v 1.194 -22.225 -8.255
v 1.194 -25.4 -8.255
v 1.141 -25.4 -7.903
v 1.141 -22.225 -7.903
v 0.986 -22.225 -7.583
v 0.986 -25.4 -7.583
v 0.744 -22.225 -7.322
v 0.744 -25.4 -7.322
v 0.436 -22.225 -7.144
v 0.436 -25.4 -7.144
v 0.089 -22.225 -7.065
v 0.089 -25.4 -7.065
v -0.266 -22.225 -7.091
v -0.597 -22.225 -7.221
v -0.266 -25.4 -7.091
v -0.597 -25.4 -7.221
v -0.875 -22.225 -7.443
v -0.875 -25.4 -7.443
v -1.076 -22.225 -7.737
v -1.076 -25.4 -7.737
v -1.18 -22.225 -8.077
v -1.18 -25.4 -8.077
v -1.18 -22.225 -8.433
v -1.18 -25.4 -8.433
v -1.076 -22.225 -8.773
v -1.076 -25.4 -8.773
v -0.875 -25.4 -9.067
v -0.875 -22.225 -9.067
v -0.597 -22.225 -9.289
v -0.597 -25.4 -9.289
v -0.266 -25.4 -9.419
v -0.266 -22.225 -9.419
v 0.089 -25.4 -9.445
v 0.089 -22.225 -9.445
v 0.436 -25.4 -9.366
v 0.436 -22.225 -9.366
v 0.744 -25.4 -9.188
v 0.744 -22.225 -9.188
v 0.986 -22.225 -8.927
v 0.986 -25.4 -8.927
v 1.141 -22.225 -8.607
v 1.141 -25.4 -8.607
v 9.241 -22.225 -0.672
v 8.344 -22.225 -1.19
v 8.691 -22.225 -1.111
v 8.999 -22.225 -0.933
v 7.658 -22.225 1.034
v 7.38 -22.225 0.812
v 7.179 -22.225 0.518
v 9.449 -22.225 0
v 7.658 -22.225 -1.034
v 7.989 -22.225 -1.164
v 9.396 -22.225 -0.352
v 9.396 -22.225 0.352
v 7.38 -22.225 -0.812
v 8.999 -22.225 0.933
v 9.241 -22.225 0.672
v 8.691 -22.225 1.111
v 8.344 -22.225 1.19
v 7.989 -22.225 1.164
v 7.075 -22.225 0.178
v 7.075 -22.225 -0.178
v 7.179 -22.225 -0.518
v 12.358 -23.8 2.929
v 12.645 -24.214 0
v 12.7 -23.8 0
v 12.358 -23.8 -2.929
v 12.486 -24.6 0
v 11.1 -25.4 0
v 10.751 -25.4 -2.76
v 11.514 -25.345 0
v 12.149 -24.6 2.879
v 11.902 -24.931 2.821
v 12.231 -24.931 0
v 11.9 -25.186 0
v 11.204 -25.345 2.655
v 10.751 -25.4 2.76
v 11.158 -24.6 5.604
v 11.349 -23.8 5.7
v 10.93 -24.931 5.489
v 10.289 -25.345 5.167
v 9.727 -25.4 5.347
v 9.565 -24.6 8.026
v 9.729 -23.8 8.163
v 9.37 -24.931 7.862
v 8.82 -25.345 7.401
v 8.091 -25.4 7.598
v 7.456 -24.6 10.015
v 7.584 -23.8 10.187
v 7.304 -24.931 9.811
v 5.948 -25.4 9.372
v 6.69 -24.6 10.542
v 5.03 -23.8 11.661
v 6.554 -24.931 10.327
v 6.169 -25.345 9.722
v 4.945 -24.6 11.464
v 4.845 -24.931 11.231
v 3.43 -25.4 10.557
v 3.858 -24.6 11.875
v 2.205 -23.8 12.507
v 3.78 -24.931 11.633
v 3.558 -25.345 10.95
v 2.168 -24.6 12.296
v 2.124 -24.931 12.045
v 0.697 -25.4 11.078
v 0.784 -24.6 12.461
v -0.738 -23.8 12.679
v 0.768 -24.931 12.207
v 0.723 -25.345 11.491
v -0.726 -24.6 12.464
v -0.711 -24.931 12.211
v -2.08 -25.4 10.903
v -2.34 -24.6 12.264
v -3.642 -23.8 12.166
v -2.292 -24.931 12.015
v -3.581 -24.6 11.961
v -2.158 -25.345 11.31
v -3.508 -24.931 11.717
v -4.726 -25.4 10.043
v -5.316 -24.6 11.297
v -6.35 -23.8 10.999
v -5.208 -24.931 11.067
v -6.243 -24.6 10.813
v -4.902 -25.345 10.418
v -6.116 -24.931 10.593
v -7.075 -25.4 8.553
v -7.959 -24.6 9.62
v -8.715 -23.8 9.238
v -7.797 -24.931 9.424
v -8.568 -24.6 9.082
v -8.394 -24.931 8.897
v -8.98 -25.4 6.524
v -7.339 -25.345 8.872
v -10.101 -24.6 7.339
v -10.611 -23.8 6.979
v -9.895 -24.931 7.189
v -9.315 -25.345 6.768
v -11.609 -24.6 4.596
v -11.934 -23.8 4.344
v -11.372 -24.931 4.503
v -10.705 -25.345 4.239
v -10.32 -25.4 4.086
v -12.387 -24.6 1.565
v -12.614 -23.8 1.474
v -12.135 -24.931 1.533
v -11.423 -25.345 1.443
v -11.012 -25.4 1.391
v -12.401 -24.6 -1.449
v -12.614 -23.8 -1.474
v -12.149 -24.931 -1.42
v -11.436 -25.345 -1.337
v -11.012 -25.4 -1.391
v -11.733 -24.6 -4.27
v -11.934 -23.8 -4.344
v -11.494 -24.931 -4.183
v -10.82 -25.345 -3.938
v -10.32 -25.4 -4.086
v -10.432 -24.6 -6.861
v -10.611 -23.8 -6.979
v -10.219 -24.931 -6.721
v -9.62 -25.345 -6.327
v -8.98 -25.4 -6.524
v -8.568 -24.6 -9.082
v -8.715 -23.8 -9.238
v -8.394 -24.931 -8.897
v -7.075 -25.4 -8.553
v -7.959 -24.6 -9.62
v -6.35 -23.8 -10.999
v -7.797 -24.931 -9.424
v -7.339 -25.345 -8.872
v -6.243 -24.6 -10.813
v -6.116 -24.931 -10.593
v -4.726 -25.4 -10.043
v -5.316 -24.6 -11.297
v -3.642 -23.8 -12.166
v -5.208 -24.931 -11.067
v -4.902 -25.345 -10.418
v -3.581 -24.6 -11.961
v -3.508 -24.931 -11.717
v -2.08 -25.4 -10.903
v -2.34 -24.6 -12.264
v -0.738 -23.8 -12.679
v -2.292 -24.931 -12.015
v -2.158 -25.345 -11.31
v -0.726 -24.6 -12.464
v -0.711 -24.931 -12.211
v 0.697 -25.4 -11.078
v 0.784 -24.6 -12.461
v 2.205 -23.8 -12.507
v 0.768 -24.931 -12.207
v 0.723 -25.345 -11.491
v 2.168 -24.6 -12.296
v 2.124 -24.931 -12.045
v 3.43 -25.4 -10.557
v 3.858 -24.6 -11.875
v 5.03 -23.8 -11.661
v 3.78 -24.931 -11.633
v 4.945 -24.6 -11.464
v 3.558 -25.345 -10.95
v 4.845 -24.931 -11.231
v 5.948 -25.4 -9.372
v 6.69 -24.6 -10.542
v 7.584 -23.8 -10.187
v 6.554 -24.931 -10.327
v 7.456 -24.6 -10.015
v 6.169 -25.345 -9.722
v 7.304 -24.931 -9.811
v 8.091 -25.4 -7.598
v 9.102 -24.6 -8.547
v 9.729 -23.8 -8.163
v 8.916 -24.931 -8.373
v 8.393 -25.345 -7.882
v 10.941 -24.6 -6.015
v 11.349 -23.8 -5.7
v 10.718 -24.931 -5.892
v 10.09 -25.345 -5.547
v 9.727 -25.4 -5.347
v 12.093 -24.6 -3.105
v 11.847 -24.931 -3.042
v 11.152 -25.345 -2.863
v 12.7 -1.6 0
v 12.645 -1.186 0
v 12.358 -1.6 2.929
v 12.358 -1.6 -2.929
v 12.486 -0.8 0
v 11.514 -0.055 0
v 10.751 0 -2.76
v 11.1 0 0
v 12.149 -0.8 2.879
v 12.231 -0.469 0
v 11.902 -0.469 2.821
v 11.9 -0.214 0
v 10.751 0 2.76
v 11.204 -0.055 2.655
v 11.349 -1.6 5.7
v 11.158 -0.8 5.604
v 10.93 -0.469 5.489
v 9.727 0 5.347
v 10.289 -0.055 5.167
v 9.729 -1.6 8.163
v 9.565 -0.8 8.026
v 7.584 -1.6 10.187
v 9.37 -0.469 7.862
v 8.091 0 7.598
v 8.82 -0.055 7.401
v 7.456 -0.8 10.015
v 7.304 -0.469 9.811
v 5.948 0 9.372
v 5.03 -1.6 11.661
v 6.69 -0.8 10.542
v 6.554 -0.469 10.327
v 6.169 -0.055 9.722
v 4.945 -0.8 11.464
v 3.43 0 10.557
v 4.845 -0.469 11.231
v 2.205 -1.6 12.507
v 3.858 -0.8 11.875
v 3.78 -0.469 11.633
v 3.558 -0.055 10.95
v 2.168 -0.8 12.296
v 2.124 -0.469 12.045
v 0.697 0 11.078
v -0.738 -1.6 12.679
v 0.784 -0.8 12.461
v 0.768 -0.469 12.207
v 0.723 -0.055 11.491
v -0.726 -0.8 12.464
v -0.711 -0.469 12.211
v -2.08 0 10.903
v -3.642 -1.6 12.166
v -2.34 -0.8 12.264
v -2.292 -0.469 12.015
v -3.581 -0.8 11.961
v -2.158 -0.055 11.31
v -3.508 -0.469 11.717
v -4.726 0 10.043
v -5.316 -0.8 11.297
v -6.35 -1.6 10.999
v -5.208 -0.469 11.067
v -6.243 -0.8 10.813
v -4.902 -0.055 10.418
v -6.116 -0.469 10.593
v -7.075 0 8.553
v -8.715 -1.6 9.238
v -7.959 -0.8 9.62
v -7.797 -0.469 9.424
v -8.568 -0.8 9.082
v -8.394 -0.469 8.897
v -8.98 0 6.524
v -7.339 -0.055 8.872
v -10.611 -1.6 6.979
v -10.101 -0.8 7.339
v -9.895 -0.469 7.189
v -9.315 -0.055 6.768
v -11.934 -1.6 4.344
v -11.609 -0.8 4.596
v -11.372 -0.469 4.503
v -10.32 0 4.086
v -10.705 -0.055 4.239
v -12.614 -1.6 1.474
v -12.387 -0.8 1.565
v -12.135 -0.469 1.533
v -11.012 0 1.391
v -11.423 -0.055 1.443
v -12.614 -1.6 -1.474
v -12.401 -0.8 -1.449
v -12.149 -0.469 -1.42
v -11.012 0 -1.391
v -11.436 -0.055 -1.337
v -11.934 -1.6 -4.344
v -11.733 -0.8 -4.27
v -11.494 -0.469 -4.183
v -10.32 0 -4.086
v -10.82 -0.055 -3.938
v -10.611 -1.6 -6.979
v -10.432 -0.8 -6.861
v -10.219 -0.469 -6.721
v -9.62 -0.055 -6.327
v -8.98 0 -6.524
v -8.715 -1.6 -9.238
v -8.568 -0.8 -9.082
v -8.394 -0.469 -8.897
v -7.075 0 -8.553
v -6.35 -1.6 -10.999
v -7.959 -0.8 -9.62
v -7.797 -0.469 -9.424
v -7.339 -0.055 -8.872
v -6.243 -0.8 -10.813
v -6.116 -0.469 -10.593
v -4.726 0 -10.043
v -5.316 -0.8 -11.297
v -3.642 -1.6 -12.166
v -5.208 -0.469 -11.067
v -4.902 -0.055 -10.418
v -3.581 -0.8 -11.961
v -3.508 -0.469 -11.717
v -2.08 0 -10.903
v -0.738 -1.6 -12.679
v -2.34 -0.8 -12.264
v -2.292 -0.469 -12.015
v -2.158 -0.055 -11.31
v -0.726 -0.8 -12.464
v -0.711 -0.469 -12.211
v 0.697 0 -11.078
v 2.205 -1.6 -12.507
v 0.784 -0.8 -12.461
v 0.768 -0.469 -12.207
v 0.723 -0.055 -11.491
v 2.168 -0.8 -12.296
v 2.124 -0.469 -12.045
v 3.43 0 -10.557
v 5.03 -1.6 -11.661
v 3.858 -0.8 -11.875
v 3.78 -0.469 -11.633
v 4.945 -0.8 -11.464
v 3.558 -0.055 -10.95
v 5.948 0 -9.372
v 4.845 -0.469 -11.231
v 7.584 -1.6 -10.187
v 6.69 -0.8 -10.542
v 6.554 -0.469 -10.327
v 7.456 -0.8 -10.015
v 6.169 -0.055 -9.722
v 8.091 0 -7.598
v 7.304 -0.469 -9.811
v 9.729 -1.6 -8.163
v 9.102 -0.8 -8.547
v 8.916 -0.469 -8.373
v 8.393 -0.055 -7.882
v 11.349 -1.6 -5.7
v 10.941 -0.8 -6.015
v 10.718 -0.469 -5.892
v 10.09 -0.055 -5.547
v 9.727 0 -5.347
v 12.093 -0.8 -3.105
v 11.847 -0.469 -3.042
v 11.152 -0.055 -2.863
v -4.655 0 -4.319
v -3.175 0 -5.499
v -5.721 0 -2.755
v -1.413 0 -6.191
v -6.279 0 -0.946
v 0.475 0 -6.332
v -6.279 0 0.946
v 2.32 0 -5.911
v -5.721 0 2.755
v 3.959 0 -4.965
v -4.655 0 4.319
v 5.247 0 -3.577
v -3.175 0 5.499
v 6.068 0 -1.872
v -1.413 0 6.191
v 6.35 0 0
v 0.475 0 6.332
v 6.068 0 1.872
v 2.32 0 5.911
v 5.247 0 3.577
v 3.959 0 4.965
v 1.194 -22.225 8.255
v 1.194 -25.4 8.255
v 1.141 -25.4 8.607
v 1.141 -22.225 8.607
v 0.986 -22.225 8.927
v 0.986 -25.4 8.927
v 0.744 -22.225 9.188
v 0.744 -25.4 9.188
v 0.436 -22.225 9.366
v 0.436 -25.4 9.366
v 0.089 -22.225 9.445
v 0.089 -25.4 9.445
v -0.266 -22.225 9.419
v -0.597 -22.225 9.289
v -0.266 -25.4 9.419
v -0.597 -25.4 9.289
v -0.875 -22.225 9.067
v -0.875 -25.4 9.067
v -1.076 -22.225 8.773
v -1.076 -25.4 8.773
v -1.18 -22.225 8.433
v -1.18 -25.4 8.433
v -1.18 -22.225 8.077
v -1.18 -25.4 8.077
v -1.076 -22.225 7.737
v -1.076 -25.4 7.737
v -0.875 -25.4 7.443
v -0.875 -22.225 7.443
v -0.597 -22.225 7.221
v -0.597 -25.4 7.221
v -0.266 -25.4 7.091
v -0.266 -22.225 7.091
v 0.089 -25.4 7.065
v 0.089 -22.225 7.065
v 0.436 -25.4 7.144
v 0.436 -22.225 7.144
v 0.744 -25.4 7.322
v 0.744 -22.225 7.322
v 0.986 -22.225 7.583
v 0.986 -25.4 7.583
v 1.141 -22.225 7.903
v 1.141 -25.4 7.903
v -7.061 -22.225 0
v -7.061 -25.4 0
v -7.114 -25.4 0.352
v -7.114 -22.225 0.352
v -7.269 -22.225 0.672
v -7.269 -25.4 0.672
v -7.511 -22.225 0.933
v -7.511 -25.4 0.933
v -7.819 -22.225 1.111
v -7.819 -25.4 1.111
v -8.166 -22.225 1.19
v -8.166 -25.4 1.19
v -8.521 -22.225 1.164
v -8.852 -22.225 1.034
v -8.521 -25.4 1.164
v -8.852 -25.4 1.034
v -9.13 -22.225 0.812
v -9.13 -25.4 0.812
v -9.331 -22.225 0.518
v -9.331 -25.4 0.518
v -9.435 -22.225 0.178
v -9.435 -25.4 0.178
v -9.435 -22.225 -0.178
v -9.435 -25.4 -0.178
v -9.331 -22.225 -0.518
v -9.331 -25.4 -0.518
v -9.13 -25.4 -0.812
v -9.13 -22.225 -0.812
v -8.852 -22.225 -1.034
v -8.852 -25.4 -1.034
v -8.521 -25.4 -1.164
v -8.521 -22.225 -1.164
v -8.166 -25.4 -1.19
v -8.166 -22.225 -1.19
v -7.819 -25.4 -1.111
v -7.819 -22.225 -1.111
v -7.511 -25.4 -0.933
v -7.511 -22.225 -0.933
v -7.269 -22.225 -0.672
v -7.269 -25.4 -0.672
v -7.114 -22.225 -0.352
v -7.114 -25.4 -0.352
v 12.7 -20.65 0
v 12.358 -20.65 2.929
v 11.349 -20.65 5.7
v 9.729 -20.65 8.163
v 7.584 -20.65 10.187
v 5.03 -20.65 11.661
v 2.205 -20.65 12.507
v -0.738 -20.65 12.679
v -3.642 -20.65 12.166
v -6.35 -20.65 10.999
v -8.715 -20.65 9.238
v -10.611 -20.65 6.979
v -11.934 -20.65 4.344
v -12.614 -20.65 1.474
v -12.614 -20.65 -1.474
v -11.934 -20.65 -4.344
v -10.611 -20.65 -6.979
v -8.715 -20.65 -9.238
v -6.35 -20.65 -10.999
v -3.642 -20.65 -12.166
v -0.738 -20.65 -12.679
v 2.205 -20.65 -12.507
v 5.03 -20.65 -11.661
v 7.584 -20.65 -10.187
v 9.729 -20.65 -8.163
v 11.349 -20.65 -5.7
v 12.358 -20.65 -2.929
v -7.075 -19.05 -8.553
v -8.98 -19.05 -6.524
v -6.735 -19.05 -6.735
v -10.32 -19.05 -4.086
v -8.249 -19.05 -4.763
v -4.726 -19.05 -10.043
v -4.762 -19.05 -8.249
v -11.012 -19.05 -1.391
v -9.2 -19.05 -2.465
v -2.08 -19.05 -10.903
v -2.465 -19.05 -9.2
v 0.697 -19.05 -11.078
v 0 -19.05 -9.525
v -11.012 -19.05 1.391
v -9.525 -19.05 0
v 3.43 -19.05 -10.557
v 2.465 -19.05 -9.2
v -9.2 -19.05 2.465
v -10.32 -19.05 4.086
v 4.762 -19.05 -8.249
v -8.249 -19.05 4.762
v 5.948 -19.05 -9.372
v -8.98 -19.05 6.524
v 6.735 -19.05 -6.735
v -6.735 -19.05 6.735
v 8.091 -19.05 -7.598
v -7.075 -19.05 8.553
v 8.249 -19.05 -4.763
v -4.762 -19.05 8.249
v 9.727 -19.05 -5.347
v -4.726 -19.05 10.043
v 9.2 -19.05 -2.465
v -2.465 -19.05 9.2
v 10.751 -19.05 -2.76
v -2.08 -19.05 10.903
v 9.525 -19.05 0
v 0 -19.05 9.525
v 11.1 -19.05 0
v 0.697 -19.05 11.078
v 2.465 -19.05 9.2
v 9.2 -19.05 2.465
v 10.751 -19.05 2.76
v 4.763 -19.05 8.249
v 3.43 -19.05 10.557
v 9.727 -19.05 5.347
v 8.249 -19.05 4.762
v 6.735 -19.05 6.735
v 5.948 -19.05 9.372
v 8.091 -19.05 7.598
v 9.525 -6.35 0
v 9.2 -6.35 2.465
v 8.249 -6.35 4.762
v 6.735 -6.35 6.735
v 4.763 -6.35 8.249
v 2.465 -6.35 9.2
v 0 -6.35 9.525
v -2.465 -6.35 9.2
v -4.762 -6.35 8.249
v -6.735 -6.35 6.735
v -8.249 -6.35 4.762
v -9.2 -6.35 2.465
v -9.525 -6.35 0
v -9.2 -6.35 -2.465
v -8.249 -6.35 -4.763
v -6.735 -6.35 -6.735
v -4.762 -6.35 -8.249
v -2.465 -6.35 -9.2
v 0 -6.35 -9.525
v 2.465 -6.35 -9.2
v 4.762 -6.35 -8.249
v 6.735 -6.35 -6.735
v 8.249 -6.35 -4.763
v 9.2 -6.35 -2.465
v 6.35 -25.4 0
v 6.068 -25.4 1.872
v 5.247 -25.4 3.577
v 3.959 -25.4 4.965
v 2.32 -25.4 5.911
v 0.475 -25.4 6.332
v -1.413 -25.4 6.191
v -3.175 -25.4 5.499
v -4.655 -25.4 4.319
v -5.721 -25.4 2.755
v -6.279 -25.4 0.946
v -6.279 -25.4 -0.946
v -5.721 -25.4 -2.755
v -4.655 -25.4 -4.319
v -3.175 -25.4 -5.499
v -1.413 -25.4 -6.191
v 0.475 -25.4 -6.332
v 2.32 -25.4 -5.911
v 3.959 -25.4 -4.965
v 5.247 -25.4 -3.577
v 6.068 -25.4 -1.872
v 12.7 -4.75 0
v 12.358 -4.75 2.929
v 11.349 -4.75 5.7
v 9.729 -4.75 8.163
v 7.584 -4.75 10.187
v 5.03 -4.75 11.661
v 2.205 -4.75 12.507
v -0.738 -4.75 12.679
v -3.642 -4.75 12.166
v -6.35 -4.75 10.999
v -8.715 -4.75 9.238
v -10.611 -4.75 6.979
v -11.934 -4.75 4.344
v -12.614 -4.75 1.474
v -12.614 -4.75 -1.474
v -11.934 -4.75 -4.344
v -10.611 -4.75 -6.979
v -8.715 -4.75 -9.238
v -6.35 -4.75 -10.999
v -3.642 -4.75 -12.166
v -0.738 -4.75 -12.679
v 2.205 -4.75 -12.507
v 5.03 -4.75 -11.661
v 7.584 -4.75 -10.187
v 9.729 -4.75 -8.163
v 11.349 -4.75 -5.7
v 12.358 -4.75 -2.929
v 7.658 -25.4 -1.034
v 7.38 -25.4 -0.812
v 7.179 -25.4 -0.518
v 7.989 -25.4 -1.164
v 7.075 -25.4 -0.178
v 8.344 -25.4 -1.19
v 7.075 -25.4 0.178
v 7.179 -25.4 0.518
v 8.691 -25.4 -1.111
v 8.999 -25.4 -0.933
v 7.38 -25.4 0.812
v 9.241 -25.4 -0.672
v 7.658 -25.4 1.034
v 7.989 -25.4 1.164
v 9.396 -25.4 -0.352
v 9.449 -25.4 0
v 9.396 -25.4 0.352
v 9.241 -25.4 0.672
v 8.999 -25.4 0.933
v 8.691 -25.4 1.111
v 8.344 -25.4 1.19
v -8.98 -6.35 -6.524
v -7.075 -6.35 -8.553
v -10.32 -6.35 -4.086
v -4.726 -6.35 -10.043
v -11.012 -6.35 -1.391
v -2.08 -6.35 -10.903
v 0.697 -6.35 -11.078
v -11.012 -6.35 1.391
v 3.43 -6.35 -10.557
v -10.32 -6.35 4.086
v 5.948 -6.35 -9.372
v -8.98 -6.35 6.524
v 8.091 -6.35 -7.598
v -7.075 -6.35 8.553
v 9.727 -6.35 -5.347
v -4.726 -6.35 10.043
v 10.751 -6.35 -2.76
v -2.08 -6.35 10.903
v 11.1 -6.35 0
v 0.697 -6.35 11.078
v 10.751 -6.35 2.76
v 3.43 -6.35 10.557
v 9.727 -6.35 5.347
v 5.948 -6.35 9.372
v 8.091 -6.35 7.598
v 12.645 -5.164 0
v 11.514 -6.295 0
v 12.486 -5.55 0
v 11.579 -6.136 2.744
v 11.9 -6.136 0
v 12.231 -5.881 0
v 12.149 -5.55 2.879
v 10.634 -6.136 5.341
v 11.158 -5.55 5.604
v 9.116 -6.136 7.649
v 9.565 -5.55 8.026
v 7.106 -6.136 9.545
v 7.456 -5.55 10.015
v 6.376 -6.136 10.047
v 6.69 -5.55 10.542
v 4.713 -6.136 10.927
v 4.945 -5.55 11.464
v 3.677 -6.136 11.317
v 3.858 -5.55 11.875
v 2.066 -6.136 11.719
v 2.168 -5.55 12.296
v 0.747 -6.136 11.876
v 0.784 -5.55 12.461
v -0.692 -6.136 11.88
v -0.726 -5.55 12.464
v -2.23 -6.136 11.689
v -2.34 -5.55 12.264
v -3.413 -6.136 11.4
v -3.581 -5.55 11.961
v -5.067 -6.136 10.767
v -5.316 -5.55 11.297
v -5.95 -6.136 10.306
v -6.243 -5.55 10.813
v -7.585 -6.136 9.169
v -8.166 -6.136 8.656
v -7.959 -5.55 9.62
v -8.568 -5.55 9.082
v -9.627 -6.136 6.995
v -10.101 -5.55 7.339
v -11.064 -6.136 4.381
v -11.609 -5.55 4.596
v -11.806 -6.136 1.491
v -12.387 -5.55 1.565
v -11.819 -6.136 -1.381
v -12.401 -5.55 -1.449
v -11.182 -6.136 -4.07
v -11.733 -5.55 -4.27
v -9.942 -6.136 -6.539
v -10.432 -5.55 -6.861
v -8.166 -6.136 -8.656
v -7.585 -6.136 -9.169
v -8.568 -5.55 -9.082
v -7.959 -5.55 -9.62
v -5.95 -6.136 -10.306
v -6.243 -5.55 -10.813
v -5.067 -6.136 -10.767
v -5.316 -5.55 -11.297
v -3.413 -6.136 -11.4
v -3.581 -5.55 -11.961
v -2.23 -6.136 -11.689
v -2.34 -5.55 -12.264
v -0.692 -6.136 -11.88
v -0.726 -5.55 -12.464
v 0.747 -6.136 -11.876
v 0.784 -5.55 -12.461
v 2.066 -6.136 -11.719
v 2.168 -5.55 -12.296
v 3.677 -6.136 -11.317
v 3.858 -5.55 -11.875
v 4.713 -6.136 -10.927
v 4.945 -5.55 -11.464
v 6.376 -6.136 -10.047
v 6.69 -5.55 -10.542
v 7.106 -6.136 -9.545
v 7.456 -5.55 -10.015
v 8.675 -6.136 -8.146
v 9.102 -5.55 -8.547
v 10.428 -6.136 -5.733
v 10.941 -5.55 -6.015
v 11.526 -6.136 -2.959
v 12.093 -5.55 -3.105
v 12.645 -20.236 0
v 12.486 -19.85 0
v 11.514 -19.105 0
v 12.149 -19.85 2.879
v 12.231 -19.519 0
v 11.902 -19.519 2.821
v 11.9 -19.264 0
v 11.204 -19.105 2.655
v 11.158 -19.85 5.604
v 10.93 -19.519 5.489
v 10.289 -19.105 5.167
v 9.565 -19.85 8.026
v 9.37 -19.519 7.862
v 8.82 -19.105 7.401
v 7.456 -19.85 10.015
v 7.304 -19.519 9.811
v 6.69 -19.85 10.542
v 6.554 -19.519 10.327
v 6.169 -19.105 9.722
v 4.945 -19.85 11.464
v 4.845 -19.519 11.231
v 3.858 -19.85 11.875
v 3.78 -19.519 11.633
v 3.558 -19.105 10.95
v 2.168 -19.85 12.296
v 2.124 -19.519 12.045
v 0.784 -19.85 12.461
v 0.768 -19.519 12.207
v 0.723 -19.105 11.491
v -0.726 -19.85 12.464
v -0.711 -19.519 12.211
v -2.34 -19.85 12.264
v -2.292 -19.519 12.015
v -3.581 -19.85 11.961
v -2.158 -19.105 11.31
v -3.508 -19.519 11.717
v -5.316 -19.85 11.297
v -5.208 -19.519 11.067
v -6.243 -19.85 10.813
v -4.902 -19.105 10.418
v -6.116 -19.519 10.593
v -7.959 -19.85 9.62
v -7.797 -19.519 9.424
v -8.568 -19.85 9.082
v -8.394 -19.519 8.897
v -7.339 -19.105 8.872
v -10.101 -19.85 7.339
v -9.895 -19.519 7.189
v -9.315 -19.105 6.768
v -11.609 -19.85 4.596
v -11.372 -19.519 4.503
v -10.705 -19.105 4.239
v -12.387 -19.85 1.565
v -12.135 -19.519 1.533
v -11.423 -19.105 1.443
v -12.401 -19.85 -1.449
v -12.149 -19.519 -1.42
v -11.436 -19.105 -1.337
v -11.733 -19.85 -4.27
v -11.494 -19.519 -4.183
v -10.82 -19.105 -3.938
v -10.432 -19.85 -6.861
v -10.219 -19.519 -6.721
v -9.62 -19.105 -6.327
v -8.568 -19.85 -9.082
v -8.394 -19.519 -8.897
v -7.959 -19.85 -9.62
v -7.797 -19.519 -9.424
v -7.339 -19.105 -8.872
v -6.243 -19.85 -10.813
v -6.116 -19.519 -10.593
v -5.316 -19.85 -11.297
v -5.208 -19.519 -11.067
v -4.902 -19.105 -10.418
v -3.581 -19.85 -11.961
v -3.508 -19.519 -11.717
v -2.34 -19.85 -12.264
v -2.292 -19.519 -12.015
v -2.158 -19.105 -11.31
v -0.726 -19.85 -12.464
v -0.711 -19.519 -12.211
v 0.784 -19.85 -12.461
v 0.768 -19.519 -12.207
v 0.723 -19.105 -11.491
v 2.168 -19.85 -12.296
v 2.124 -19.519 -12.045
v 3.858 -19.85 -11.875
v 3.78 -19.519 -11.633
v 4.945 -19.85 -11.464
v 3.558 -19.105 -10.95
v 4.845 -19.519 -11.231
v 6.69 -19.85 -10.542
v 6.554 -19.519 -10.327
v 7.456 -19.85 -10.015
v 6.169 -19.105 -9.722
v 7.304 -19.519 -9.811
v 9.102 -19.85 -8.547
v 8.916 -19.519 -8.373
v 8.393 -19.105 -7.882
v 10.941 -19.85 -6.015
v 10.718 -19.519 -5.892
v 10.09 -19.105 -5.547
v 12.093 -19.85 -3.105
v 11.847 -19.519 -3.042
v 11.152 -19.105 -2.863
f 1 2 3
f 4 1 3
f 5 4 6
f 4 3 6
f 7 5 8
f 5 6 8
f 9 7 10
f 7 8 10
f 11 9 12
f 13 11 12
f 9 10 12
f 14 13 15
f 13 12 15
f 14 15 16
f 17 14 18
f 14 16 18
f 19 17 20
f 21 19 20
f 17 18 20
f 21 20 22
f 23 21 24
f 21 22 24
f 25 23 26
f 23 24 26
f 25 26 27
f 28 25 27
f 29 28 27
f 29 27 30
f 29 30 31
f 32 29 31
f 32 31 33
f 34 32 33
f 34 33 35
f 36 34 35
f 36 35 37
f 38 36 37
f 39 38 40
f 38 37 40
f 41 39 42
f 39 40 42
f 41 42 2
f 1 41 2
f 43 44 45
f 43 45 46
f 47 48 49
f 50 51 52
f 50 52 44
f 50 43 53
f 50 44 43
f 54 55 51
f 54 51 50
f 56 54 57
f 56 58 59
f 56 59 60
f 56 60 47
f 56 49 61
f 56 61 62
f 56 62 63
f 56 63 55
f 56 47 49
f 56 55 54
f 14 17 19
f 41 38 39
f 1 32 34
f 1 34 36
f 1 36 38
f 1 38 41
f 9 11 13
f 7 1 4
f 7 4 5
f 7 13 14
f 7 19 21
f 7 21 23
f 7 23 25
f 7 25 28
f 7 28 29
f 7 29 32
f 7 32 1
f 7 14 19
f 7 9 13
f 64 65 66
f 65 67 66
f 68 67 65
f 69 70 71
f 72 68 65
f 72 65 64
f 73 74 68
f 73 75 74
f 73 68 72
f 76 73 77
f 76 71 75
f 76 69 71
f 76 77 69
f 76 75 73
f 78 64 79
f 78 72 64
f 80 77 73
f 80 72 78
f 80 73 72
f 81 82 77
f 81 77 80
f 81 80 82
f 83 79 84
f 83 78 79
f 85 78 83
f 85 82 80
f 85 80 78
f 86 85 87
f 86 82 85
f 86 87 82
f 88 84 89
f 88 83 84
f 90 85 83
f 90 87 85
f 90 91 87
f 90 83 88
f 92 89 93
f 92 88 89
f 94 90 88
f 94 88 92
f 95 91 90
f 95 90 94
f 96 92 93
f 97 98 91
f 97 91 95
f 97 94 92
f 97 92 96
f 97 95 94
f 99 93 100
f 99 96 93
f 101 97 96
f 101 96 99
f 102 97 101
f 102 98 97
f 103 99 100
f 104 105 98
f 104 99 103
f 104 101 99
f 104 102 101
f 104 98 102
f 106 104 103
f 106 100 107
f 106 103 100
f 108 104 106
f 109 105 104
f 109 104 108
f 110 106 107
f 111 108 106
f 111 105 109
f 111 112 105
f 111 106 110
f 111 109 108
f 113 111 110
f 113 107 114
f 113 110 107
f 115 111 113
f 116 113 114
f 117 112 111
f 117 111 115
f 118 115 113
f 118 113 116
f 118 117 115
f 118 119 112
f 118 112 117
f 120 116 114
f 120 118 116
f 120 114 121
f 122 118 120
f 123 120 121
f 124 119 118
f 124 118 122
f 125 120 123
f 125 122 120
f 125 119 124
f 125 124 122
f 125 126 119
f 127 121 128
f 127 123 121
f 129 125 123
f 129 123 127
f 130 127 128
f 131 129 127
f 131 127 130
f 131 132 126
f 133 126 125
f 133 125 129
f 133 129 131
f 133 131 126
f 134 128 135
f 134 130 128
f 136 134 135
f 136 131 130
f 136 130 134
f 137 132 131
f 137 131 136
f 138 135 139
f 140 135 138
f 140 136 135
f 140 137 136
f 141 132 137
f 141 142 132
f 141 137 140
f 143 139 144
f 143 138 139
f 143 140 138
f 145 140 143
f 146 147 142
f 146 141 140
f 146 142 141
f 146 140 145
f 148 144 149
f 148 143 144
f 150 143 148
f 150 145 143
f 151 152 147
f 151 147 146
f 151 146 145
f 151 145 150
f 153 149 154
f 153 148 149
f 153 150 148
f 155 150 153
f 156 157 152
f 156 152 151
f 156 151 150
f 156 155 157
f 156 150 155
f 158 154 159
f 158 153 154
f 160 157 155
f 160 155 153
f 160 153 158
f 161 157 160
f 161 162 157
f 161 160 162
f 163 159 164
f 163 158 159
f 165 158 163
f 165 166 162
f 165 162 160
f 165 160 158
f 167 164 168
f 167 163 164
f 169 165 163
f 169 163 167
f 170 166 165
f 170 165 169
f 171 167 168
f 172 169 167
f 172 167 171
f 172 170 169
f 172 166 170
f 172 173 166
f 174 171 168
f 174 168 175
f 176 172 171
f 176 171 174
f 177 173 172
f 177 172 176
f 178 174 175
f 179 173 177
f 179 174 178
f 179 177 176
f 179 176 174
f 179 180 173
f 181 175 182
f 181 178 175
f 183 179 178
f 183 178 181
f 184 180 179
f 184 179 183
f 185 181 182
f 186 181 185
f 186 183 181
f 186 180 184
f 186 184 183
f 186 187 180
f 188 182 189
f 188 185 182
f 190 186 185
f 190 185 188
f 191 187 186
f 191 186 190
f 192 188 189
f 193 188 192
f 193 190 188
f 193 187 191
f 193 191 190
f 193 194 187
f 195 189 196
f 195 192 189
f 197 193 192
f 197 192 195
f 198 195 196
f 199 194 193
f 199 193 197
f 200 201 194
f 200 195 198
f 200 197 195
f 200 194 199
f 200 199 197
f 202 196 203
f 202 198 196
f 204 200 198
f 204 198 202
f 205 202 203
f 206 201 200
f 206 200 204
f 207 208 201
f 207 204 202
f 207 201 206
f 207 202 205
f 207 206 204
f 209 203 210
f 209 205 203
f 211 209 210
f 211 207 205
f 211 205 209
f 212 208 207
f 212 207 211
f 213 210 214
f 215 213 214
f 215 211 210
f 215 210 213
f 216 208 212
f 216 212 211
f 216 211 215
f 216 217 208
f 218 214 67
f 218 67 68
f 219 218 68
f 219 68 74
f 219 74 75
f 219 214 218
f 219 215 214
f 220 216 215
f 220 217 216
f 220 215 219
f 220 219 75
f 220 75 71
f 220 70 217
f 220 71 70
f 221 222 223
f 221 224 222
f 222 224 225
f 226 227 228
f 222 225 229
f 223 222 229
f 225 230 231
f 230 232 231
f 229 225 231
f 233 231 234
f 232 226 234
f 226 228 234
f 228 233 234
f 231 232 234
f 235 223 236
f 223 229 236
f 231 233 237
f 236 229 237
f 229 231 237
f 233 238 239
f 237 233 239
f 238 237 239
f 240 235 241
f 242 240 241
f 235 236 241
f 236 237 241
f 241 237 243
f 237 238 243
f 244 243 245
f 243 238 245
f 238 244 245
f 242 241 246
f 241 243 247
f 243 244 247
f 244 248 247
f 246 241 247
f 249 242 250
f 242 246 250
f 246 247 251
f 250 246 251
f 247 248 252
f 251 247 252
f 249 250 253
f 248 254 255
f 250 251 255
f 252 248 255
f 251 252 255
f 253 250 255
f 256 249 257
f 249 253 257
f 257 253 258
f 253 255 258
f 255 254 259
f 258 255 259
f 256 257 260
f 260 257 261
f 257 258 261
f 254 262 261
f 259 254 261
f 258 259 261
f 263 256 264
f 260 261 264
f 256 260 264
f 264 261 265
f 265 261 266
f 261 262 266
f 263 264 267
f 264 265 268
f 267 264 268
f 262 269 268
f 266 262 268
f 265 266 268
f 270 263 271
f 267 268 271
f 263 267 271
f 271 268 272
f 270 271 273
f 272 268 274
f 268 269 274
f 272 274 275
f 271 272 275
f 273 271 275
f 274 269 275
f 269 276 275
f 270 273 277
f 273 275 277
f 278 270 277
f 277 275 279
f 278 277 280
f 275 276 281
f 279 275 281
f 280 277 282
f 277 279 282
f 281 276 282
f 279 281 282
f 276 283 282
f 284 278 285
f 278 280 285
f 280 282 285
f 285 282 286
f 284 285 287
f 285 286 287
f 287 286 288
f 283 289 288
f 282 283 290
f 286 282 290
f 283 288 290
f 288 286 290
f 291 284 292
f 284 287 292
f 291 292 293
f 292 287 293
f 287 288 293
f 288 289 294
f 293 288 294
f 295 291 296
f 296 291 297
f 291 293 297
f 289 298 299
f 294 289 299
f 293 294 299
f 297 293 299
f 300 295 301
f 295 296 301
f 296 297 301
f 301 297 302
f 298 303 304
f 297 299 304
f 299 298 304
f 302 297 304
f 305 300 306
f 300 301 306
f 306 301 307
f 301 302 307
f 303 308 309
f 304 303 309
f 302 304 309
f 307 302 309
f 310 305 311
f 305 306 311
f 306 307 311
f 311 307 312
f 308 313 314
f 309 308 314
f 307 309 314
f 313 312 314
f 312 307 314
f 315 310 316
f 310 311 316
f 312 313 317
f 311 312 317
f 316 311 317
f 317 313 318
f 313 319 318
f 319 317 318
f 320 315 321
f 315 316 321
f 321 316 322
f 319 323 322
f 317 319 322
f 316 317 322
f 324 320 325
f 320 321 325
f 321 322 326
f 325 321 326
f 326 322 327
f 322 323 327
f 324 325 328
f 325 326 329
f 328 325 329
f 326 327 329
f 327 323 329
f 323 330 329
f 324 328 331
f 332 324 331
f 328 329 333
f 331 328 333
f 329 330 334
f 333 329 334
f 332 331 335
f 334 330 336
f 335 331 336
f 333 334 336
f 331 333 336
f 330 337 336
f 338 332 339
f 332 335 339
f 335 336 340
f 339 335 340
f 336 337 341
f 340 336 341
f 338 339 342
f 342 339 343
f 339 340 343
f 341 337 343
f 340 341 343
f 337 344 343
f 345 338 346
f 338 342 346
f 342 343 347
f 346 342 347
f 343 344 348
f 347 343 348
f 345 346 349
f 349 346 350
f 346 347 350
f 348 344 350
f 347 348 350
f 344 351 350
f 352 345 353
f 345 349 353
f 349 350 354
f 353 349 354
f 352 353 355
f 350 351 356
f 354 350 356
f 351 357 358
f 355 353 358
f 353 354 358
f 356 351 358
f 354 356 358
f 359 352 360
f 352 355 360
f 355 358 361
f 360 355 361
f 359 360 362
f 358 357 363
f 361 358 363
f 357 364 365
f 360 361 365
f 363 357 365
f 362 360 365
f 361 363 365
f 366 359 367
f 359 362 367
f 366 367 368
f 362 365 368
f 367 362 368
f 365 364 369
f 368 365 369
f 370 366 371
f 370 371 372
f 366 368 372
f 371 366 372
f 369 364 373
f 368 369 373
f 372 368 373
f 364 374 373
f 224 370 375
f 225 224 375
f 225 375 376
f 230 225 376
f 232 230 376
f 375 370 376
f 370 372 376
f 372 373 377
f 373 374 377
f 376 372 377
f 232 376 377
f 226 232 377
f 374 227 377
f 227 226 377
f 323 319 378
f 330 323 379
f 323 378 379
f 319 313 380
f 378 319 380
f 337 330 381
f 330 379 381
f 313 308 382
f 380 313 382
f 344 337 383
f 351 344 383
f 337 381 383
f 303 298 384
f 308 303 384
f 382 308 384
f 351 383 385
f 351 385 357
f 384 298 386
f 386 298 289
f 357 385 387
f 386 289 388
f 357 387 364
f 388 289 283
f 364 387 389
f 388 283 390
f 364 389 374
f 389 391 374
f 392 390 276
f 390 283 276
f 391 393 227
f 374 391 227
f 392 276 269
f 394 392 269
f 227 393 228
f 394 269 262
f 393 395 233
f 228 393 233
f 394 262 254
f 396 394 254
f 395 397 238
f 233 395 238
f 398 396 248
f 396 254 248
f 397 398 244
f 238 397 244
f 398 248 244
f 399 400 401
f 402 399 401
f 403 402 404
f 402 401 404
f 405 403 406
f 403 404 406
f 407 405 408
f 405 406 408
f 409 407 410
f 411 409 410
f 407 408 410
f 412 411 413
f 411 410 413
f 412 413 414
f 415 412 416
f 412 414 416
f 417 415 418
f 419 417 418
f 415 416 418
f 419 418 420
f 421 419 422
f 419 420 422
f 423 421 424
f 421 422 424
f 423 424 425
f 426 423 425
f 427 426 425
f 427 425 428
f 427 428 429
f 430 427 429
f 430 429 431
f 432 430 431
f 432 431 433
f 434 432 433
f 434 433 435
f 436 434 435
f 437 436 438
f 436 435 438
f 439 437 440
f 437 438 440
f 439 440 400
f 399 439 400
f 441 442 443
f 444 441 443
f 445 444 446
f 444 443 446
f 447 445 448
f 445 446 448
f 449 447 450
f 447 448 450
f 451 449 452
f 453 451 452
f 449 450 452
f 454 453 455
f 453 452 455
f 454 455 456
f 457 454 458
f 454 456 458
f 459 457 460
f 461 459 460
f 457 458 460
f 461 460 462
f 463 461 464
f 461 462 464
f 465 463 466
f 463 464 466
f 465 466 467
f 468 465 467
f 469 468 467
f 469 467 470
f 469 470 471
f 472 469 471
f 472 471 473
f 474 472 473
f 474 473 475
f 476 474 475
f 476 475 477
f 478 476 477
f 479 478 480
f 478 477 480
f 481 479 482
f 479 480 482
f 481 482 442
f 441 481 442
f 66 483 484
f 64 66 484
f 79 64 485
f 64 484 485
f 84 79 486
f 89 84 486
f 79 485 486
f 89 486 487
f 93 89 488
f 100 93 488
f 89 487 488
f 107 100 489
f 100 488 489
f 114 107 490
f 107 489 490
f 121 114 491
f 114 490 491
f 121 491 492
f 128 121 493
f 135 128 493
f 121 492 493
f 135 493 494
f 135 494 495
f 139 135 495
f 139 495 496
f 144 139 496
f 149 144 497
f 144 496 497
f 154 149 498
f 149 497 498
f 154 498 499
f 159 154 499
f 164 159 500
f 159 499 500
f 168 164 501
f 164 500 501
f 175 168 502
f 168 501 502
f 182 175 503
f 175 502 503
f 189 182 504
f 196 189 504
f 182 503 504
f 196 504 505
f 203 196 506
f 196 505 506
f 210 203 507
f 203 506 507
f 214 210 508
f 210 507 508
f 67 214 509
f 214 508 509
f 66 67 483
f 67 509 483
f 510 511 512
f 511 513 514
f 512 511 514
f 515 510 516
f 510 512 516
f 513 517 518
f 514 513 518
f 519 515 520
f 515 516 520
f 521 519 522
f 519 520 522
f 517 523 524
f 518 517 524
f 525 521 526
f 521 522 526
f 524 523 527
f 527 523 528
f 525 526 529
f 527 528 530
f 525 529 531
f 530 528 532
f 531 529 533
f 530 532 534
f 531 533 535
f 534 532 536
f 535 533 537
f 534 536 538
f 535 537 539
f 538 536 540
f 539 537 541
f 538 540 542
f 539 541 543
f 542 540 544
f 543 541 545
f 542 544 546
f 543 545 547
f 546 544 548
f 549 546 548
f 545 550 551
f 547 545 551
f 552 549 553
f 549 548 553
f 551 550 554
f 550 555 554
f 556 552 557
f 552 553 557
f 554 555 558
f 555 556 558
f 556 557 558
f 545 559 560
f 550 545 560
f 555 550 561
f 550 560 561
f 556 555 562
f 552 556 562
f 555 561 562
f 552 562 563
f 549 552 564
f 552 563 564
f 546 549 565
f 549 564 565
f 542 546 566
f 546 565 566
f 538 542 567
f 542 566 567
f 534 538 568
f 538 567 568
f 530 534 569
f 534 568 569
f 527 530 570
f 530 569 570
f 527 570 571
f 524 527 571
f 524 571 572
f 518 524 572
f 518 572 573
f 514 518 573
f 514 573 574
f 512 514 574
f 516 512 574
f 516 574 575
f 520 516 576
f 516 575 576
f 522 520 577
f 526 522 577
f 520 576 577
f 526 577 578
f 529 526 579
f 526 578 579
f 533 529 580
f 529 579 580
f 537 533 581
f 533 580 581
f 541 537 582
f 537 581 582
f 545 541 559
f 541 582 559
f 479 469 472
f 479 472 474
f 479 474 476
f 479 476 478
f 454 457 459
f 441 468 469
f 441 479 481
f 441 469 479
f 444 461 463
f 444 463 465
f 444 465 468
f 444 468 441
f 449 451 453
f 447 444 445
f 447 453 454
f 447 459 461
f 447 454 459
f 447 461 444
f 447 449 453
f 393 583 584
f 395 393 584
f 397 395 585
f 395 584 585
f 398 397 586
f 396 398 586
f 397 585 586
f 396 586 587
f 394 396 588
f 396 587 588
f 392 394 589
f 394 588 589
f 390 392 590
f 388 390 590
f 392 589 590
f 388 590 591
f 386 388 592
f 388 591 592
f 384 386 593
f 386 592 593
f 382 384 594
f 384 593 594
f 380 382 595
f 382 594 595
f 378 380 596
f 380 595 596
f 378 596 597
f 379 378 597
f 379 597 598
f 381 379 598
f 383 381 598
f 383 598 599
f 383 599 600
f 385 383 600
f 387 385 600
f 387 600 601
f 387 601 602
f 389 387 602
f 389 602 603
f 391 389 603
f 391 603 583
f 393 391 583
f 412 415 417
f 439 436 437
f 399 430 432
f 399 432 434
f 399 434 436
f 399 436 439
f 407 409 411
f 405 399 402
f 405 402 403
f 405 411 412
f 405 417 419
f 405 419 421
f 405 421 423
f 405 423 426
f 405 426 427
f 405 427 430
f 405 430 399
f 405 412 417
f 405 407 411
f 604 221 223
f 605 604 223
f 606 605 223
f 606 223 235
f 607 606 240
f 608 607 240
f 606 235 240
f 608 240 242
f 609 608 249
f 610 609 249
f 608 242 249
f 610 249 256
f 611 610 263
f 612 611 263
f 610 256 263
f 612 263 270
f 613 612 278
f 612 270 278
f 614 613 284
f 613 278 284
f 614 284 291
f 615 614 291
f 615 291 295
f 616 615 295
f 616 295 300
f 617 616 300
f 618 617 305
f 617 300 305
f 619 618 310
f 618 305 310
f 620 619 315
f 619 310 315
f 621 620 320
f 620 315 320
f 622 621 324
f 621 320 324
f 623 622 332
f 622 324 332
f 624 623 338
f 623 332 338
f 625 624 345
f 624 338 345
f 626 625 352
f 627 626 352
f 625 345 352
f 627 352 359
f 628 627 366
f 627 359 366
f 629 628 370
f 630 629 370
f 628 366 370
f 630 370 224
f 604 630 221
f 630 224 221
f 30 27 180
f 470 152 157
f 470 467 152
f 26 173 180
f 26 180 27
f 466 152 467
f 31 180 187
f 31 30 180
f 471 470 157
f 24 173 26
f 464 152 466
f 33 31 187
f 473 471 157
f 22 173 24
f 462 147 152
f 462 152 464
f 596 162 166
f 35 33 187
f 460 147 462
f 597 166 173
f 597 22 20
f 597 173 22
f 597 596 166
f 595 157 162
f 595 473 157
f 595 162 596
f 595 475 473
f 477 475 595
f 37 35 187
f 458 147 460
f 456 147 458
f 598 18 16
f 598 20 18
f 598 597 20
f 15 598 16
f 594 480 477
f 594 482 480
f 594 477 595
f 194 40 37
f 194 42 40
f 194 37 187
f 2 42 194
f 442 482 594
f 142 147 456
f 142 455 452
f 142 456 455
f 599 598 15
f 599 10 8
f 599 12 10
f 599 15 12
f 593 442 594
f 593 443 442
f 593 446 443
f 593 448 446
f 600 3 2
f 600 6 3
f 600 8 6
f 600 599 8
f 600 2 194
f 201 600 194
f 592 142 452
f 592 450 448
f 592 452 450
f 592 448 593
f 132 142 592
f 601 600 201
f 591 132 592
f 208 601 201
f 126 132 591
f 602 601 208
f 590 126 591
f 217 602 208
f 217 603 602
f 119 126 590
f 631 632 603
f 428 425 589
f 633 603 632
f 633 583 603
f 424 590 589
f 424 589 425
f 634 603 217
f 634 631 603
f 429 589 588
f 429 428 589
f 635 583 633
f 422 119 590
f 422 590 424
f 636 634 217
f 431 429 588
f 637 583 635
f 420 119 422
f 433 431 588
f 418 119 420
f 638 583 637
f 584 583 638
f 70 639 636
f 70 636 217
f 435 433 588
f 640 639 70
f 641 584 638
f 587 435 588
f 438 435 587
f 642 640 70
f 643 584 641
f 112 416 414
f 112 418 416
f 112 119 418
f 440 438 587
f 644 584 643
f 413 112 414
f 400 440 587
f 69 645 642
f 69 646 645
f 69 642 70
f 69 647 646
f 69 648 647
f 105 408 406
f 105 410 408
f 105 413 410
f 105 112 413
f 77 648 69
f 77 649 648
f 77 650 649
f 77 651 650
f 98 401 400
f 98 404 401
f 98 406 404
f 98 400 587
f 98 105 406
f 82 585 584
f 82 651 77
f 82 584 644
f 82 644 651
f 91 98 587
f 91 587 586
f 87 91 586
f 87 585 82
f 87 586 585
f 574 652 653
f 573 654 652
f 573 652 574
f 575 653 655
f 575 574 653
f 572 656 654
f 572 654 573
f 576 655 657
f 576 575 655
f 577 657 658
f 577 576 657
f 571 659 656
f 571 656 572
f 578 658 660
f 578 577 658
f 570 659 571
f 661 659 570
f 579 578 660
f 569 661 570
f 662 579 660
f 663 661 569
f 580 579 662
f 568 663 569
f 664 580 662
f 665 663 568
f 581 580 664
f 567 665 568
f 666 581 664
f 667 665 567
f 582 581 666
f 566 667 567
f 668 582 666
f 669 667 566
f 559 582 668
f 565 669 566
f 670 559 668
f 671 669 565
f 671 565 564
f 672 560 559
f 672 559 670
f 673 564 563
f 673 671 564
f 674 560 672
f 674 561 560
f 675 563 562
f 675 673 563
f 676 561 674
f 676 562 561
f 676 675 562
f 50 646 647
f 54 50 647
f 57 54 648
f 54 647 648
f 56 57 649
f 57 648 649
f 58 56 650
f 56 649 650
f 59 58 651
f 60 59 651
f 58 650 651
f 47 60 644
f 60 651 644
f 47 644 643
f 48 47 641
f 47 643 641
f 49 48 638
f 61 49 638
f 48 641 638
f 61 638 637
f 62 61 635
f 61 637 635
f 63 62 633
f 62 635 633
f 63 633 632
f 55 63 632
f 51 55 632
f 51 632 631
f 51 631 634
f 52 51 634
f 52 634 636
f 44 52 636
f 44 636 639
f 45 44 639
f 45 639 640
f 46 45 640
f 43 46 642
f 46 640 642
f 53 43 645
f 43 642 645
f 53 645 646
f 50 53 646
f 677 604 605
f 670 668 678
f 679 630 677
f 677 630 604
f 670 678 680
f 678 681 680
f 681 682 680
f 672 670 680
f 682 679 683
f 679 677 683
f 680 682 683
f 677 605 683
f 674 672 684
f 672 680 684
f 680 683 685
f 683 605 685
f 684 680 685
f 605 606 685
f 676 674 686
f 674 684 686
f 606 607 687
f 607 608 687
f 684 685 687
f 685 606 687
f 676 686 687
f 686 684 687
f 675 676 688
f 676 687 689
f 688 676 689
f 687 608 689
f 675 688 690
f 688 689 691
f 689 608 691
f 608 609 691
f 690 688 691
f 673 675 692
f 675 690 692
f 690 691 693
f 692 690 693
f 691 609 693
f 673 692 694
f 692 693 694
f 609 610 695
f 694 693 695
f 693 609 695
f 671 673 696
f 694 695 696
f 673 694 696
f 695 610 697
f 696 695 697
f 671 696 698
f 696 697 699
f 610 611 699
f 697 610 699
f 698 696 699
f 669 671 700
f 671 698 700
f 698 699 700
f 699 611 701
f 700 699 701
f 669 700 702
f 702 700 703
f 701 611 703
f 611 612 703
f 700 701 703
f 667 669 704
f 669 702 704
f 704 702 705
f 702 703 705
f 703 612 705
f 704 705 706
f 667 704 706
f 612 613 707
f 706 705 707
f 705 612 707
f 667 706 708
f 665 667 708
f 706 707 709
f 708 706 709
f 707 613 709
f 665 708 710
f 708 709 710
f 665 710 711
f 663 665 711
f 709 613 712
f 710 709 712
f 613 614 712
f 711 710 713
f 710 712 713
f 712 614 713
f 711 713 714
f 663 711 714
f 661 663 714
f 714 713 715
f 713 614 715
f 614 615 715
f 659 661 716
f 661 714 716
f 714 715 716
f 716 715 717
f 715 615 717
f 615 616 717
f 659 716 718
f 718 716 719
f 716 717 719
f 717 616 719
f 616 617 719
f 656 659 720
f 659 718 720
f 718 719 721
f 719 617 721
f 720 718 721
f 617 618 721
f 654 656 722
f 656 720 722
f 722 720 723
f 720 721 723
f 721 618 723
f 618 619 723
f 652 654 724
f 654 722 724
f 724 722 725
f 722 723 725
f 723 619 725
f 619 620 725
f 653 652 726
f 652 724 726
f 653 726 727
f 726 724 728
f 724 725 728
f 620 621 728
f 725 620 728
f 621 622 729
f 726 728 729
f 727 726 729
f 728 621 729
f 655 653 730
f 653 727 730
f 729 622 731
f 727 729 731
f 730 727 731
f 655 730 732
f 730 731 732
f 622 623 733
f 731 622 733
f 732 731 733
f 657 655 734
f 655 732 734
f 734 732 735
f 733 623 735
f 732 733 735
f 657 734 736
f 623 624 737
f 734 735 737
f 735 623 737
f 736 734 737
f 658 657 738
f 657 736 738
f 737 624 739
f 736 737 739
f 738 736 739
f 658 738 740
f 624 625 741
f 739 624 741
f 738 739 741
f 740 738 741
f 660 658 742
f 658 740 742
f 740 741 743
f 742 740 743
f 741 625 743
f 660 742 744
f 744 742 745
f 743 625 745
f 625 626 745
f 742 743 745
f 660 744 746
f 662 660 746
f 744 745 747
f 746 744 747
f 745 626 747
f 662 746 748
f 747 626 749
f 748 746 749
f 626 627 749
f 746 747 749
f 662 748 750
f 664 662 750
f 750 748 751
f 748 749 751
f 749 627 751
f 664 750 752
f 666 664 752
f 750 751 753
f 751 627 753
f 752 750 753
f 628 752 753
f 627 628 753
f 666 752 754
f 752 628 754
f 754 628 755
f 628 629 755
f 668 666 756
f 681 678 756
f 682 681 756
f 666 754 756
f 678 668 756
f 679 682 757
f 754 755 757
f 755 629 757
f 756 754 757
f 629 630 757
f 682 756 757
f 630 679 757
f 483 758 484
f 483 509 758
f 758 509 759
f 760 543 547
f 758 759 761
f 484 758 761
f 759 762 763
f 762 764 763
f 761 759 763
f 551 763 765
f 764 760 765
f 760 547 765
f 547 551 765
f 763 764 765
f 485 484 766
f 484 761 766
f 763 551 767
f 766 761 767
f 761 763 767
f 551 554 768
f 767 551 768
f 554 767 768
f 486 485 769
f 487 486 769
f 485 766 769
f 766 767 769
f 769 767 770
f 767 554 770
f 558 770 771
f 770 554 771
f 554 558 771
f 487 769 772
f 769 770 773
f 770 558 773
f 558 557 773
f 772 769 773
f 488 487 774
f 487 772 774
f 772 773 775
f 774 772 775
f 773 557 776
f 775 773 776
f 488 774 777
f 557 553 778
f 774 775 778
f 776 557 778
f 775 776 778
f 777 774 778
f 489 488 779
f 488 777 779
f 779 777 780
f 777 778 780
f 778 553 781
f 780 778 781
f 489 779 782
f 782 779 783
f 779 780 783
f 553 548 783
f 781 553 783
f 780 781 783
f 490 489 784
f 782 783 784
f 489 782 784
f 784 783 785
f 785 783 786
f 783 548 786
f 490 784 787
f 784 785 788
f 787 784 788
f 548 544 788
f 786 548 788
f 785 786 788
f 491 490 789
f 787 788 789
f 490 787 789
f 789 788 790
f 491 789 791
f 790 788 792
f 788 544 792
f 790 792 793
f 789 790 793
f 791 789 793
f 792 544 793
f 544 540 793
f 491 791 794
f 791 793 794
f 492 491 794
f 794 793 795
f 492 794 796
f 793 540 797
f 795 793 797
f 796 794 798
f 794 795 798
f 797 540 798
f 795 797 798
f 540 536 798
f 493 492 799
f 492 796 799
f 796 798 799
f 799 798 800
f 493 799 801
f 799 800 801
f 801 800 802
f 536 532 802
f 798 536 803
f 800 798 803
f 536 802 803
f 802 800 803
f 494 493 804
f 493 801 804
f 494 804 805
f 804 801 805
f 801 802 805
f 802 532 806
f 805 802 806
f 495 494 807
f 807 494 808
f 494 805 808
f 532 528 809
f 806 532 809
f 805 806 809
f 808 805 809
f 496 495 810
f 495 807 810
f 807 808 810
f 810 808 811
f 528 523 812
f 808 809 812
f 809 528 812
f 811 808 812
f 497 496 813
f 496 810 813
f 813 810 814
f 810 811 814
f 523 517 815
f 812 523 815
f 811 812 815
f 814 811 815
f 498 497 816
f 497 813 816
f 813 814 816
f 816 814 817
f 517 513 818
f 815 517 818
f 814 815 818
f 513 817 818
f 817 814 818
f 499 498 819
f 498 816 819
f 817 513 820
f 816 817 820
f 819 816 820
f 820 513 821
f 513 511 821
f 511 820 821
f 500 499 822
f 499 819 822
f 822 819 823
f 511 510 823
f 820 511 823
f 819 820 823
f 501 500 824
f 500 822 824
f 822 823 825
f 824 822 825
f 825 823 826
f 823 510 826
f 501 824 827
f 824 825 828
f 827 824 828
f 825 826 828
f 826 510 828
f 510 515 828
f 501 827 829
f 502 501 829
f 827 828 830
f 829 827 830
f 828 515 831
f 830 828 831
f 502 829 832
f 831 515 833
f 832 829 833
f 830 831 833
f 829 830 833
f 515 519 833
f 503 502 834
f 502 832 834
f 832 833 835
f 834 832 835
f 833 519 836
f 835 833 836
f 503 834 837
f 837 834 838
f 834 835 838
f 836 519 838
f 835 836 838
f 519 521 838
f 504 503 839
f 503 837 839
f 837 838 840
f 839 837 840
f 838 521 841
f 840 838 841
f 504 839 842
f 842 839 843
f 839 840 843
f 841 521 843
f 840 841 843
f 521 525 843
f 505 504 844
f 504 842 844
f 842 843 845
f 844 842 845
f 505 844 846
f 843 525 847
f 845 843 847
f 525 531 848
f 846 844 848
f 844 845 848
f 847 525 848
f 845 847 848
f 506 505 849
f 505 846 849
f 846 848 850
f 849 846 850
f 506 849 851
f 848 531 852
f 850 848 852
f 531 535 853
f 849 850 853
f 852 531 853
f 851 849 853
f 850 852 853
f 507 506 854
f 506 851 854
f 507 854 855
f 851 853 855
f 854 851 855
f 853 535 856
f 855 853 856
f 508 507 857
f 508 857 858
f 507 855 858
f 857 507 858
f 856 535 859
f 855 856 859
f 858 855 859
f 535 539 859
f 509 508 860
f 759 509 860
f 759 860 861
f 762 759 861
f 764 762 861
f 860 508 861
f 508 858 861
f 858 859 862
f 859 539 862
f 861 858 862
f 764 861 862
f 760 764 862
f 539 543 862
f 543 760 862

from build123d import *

# Parameters (mm, degrees)
F0_R      = 12.7
F1_DEPTH  = 6.35
F2_R      = 9.525
F3_DEPTH  = 12.7
F4_R      = 12.7
F5_DEPTH  = 6.35
F6_R      = 1.6002
F7_R      = 1.1938
F8_DEPTH  = 3.175
F9_R      = 6.35
F10_DEPTH = 25.401


with BuildPart() as f1:
    # F0 (on Front) → F1 (new body)
    with BuildSketch(Plane.XZ):
        Circle(F0_R)
    extrude(amount=F1_DEPTH)

    # F2 (on face) → F3 (join)
    with BuildSketch(Plane.XZ.offset(6.35)):
        Circle(F2_R)
    extrude(amount=F3_DEPTH)

    # F4 (on face) → F5 (join)
    with BuildSketch(Plane.XZ.offset(19.05)):
        Circle(F4_R)
    extrude(amount=F5_DEPTH)

    # F6
    f6_edges = [f1.edges().sort_by_distance(p)[0] for p in [
        (-12.7, -25.4, 0),
        (-12.7, -19.05, 0),
        (-12.7, -6.35, 0),
        (-12.7, 0, 0),
    ]]
    fillet(f6_edges, radius=F6_R)

    # F7 (on face) → F8 (cut)
    with BuildSketch(Plane.XZ.offset(25.4)):
        with Locations((-8.255, 0)):
            Circle(F7_R)
        with Locations((0, -8.255)):
            Circle(F7_R)
        with Locations((8.255, 0)):
            Circle(F7_R)
        with Locations((0, 8.255)):
            Circle(F7_R)
    extrude(amount=-F8_DEPTH, mode=Mode.SUBTRACT)

    # F9 (on face) → F10 (cut, through all)
    with BuildSketch(Plane.XZ.offset(25.4)):
        Circle(F9_R)
    extrude(amount=-F10_DEPTH, mode=Mode.SUBTRACT)


solid = f1.part
